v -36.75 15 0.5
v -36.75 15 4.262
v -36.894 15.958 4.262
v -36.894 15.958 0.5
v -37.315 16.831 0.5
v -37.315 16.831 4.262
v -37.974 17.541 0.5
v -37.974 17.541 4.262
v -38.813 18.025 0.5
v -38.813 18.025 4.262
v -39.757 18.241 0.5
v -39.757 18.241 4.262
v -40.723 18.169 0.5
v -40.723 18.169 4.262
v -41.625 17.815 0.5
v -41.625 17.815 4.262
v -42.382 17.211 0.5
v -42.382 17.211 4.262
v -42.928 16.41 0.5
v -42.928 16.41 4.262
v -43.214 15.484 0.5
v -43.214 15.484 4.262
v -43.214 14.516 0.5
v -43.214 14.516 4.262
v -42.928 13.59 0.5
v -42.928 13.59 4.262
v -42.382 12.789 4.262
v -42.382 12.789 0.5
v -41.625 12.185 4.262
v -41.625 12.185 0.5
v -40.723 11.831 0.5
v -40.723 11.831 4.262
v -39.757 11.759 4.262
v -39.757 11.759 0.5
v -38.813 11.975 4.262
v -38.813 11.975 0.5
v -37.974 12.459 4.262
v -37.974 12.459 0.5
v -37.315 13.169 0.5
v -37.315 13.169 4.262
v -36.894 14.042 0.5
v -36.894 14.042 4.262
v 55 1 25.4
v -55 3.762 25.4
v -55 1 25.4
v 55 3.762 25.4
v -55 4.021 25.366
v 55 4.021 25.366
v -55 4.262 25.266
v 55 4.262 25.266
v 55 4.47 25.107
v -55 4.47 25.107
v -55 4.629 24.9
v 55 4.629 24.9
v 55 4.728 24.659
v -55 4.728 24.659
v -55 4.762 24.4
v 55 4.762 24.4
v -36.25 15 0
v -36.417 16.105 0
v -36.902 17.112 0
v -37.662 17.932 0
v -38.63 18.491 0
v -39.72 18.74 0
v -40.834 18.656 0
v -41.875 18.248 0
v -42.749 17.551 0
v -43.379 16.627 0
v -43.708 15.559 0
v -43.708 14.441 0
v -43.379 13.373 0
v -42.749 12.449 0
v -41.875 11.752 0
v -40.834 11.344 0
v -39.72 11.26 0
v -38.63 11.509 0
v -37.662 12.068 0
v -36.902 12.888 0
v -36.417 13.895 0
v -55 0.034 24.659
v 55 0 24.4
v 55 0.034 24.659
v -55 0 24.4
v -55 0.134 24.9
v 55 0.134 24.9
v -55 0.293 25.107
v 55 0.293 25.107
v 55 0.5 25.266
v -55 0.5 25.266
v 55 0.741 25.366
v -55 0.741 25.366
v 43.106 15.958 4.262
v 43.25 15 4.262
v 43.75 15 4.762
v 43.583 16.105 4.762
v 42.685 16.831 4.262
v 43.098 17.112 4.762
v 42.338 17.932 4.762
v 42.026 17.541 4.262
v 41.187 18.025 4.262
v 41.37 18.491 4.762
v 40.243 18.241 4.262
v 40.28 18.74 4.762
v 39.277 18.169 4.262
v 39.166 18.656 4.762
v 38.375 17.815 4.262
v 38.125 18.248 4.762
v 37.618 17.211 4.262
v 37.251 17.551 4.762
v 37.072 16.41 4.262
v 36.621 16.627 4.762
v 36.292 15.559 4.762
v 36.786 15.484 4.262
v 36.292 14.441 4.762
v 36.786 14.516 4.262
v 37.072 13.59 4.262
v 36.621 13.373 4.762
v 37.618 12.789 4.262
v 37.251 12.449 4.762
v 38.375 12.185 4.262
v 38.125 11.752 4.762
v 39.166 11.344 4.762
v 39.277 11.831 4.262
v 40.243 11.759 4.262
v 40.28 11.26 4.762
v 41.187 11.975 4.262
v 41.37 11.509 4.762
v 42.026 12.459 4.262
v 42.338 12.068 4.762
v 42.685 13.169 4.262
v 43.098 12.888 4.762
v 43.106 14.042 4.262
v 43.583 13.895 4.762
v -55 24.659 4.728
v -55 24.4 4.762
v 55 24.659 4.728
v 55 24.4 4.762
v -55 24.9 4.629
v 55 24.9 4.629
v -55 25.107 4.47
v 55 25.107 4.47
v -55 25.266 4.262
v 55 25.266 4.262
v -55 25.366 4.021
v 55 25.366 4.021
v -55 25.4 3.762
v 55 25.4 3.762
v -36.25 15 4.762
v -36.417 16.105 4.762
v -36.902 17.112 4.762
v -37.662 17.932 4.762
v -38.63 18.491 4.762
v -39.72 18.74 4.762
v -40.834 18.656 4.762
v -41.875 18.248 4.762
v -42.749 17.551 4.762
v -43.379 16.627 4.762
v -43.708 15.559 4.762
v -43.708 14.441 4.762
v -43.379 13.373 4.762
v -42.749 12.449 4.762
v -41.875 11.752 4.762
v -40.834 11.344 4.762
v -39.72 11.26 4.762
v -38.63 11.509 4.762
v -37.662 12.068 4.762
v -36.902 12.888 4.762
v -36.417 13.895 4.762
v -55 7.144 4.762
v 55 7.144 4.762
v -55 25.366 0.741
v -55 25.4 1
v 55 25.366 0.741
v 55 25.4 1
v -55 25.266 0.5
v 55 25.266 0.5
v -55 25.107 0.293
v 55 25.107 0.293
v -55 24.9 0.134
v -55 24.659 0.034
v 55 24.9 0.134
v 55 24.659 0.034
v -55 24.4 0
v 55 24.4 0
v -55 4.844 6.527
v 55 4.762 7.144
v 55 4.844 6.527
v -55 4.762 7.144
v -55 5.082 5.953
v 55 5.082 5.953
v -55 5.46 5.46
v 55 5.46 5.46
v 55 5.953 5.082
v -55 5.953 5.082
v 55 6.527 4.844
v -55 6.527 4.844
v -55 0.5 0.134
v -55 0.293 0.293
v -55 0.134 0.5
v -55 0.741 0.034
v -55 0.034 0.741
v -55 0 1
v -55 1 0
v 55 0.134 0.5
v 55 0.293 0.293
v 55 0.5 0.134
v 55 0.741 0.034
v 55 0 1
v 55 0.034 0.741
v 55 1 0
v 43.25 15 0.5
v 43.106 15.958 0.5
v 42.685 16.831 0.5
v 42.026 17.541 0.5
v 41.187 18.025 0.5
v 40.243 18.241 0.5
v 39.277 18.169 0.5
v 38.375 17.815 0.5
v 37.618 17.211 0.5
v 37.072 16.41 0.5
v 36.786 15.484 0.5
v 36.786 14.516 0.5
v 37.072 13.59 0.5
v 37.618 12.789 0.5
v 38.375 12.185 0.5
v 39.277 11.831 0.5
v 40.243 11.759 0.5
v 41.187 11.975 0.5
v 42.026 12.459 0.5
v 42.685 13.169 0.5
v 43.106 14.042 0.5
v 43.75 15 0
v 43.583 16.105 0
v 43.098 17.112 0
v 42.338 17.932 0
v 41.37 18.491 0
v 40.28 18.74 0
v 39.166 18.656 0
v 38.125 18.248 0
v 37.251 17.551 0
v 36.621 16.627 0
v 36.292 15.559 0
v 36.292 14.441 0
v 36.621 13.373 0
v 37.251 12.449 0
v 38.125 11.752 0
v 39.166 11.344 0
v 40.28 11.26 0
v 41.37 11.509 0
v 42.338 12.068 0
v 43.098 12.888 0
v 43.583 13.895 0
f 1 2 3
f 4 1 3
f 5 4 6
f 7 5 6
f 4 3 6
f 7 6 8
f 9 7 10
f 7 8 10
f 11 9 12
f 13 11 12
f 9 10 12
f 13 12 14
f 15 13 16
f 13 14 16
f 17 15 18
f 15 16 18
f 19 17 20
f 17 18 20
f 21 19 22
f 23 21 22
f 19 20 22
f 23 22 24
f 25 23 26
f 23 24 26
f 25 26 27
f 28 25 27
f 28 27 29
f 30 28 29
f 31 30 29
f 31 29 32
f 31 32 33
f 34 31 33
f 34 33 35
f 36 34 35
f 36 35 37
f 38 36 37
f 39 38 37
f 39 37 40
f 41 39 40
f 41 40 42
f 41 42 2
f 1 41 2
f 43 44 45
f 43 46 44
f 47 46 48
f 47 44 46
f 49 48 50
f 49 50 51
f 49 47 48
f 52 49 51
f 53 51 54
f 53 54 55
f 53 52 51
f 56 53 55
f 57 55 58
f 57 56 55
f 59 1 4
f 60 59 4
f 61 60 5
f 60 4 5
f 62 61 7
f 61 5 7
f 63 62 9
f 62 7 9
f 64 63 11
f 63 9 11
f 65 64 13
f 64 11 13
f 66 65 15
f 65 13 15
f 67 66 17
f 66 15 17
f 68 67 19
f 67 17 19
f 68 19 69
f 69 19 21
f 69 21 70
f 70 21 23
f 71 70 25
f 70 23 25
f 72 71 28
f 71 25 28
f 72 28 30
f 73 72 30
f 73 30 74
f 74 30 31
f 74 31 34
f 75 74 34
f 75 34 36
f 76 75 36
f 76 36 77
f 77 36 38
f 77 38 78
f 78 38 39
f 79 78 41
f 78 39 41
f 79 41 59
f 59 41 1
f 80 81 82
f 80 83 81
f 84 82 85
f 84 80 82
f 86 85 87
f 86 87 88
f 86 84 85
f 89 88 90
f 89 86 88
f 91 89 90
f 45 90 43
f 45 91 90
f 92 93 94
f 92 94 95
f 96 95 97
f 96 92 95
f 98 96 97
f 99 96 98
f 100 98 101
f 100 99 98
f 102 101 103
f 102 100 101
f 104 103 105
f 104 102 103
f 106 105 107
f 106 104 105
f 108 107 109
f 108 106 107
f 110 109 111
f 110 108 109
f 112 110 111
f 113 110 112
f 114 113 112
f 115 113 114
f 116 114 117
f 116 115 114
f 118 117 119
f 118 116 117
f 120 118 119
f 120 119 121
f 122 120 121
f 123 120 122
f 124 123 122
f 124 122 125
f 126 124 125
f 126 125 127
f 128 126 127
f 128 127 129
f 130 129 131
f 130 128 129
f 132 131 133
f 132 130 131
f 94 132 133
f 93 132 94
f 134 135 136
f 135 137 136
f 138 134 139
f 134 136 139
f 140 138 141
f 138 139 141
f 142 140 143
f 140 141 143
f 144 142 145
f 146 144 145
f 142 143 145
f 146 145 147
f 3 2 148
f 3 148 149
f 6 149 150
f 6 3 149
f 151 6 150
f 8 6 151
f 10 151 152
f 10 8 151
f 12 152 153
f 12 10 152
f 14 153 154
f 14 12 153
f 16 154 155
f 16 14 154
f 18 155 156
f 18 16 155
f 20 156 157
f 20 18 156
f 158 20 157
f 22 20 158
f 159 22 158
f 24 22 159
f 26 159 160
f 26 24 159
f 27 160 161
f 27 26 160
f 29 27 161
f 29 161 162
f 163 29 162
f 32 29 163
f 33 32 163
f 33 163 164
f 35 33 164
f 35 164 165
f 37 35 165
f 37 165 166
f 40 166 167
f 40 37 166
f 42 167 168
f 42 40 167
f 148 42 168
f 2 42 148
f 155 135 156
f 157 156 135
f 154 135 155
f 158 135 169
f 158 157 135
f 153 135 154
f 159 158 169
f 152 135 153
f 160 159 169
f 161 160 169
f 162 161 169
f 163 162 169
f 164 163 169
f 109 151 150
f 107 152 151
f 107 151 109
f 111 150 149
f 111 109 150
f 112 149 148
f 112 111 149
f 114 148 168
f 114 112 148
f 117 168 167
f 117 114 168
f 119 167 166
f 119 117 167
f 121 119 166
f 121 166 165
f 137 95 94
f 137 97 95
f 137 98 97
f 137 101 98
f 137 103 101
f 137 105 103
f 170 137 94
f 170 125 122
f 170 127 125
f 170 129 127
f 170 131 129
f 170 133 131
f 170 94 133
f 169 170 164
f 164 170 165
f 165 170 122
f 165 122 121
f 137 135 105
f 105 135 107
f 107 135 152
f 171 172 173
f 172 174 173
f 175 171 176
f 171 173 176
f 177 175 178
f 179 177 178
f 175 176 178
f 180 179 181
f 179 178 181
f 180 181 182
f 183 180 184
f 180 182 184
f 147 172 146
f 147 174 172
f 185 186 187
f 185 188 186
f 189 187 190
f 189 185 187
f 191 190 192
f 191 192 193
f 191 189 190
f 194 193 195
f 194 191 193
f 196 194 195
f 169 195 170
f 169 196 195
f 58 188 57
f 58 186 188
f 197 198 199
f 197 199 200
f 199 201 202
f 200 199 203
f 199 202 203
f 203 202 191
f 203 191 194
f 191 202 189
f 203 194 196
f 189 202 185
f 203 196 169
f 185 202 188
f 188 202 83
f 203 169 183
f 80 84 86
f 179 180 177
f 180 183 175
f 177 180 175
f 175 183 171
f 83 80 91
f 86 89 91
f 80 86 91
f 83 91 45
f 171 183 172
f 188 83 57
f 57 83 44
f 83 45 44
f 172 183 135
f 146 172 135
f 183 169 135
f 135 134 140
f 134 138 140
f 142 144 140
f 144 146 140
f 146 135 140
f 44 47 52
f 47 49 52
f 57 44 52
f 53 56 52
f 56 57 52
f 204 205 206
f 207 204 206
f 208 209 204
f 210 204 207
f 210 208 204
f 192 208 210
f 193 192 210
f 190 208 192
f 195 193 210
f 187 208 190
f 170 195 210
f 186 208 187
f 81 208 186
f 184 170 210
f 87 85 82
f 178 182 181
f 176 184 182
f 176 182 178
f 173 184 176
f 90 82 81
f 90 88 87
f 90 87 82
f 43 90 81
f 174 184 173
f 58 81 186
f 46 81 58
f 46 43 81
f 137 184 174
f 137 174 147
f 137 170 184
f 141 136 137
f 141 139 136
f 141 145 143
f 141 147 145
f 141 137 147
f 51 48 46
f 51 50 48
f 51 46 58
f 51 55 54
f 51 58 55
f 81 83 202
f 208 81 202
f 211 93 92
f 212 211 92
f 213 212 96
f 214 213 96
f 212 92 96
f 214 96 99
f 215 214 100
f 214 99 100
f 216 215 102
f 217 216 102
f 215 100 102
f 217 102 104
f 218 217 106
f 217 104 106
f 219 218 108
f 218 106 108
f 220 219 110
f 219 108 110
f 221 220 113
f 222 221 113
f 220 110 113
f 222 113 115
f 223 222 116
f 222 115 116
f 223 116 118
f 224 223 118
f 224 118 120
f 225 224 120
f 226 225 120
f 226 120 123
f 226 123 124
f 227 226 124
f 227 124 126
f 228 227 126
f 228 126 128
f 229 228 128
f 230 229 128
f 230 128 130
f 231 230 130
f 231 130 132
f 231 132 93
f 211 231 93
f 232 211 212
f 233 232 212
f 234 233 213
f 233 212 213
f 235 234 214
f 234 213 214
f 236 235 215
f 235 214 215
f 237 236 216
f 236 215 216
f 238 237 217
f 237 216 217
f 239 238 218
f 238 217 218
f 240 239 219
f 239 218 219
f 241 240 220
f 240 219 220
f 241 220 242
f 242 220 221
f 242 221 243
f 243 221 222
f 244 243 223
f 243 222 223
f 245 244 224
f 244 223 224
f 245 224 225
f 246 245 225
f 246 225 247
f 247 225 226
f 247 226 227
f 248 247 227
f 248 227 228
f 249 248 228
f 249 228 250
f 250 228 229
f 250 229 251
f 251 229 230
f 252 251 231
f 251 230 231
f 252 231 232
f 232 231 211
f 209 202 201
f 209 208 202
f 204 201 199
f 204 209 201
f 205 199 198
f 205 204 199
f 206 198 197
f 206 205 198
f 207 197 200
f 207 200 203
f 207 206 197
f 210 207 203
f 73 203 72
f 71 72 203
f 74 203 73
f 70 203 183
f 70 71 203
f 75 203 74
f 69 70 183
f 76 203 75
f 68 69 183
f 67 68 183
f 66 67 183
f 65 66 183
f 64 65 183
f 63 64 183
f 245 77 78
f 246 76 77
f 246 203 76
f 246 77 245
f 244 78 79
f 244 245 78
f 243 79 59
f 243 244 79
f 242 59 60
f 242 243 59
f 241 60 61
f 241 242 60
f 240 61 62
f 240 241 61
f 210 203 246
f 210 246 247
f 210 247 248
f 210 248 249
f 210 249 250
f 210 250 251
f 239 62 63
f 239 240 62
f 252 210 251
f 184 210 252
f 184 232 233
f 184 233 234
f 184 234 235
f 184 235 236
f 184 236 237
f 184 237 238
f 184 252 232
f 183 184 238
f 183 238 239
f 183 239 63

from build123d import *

# Parameters (mm, degrees)
F1_DEPTH = 55
F2_R     = 1
F3_R     = 2.38125
F4_R     = 3.25
F5_DEPTH = 25
F6_SIZE  = 0.5


with BuildPart() as f1:
    # F0 (on Right) → F1 (new body, symmetric)
    with BuildSketch(Plane.YZ):
        Polygon((0, 25.4), (0, 0), (25.4, 0), (25.4, 4.7625), (4.7625, 4.7625), (4.7625, 25.4), align=None)
    extrude(amount=F1_DEPTH, both=True)

    # F2
    f2_edges = [f1.edges().sort_by_distance(p)[0] for p in [
        (0, 0, 25.4),
        (0, 4.7625, 25.4),
        (0, 0, 0),
        (0, 25.4, 4.7625),
        (0, 25.4, 0),
    ]]
    fillet(f2_edges, radius=F2_R)

    # F3
    f3_edges = [f1.edges().sort_by_distance(p)[0] for p in [
        (0, 4.7625, 4.7625),
    ]]
    fillet(f3_edges, radius=F3_R)

    # F4 (on face) → F5 (cut)
    with BuildSketch(Plane.XY.offset(4.7625)):
        with Locations((-40, 15)):
            Circle(F4_R)
        with Locations((690, 15)):
            Circle(F4_R)
        with Locations((1420, 15)):
            Circle(F4_R)
        with Locations((40, 15)):
            Circle(F4_R)
    extrude(amount=-F5_DEPTH, mode=Mode.SUBTRACT)

    # F6
    f6_edges = [f1.edges().sort_by_distance(p)[0] for p in [
        (-43.25, 15, 4.7625),
        (-36.75, 15, 2.38125),
        (-43.25, 15, 0),
        (36.75, 15, 4.7625),
        (43.25, 15, 2.38125),
        (36.75, 15, 0),
    ]]
    chamfer(f6_edges, length=F6_SIZE)


solid = f1.part
